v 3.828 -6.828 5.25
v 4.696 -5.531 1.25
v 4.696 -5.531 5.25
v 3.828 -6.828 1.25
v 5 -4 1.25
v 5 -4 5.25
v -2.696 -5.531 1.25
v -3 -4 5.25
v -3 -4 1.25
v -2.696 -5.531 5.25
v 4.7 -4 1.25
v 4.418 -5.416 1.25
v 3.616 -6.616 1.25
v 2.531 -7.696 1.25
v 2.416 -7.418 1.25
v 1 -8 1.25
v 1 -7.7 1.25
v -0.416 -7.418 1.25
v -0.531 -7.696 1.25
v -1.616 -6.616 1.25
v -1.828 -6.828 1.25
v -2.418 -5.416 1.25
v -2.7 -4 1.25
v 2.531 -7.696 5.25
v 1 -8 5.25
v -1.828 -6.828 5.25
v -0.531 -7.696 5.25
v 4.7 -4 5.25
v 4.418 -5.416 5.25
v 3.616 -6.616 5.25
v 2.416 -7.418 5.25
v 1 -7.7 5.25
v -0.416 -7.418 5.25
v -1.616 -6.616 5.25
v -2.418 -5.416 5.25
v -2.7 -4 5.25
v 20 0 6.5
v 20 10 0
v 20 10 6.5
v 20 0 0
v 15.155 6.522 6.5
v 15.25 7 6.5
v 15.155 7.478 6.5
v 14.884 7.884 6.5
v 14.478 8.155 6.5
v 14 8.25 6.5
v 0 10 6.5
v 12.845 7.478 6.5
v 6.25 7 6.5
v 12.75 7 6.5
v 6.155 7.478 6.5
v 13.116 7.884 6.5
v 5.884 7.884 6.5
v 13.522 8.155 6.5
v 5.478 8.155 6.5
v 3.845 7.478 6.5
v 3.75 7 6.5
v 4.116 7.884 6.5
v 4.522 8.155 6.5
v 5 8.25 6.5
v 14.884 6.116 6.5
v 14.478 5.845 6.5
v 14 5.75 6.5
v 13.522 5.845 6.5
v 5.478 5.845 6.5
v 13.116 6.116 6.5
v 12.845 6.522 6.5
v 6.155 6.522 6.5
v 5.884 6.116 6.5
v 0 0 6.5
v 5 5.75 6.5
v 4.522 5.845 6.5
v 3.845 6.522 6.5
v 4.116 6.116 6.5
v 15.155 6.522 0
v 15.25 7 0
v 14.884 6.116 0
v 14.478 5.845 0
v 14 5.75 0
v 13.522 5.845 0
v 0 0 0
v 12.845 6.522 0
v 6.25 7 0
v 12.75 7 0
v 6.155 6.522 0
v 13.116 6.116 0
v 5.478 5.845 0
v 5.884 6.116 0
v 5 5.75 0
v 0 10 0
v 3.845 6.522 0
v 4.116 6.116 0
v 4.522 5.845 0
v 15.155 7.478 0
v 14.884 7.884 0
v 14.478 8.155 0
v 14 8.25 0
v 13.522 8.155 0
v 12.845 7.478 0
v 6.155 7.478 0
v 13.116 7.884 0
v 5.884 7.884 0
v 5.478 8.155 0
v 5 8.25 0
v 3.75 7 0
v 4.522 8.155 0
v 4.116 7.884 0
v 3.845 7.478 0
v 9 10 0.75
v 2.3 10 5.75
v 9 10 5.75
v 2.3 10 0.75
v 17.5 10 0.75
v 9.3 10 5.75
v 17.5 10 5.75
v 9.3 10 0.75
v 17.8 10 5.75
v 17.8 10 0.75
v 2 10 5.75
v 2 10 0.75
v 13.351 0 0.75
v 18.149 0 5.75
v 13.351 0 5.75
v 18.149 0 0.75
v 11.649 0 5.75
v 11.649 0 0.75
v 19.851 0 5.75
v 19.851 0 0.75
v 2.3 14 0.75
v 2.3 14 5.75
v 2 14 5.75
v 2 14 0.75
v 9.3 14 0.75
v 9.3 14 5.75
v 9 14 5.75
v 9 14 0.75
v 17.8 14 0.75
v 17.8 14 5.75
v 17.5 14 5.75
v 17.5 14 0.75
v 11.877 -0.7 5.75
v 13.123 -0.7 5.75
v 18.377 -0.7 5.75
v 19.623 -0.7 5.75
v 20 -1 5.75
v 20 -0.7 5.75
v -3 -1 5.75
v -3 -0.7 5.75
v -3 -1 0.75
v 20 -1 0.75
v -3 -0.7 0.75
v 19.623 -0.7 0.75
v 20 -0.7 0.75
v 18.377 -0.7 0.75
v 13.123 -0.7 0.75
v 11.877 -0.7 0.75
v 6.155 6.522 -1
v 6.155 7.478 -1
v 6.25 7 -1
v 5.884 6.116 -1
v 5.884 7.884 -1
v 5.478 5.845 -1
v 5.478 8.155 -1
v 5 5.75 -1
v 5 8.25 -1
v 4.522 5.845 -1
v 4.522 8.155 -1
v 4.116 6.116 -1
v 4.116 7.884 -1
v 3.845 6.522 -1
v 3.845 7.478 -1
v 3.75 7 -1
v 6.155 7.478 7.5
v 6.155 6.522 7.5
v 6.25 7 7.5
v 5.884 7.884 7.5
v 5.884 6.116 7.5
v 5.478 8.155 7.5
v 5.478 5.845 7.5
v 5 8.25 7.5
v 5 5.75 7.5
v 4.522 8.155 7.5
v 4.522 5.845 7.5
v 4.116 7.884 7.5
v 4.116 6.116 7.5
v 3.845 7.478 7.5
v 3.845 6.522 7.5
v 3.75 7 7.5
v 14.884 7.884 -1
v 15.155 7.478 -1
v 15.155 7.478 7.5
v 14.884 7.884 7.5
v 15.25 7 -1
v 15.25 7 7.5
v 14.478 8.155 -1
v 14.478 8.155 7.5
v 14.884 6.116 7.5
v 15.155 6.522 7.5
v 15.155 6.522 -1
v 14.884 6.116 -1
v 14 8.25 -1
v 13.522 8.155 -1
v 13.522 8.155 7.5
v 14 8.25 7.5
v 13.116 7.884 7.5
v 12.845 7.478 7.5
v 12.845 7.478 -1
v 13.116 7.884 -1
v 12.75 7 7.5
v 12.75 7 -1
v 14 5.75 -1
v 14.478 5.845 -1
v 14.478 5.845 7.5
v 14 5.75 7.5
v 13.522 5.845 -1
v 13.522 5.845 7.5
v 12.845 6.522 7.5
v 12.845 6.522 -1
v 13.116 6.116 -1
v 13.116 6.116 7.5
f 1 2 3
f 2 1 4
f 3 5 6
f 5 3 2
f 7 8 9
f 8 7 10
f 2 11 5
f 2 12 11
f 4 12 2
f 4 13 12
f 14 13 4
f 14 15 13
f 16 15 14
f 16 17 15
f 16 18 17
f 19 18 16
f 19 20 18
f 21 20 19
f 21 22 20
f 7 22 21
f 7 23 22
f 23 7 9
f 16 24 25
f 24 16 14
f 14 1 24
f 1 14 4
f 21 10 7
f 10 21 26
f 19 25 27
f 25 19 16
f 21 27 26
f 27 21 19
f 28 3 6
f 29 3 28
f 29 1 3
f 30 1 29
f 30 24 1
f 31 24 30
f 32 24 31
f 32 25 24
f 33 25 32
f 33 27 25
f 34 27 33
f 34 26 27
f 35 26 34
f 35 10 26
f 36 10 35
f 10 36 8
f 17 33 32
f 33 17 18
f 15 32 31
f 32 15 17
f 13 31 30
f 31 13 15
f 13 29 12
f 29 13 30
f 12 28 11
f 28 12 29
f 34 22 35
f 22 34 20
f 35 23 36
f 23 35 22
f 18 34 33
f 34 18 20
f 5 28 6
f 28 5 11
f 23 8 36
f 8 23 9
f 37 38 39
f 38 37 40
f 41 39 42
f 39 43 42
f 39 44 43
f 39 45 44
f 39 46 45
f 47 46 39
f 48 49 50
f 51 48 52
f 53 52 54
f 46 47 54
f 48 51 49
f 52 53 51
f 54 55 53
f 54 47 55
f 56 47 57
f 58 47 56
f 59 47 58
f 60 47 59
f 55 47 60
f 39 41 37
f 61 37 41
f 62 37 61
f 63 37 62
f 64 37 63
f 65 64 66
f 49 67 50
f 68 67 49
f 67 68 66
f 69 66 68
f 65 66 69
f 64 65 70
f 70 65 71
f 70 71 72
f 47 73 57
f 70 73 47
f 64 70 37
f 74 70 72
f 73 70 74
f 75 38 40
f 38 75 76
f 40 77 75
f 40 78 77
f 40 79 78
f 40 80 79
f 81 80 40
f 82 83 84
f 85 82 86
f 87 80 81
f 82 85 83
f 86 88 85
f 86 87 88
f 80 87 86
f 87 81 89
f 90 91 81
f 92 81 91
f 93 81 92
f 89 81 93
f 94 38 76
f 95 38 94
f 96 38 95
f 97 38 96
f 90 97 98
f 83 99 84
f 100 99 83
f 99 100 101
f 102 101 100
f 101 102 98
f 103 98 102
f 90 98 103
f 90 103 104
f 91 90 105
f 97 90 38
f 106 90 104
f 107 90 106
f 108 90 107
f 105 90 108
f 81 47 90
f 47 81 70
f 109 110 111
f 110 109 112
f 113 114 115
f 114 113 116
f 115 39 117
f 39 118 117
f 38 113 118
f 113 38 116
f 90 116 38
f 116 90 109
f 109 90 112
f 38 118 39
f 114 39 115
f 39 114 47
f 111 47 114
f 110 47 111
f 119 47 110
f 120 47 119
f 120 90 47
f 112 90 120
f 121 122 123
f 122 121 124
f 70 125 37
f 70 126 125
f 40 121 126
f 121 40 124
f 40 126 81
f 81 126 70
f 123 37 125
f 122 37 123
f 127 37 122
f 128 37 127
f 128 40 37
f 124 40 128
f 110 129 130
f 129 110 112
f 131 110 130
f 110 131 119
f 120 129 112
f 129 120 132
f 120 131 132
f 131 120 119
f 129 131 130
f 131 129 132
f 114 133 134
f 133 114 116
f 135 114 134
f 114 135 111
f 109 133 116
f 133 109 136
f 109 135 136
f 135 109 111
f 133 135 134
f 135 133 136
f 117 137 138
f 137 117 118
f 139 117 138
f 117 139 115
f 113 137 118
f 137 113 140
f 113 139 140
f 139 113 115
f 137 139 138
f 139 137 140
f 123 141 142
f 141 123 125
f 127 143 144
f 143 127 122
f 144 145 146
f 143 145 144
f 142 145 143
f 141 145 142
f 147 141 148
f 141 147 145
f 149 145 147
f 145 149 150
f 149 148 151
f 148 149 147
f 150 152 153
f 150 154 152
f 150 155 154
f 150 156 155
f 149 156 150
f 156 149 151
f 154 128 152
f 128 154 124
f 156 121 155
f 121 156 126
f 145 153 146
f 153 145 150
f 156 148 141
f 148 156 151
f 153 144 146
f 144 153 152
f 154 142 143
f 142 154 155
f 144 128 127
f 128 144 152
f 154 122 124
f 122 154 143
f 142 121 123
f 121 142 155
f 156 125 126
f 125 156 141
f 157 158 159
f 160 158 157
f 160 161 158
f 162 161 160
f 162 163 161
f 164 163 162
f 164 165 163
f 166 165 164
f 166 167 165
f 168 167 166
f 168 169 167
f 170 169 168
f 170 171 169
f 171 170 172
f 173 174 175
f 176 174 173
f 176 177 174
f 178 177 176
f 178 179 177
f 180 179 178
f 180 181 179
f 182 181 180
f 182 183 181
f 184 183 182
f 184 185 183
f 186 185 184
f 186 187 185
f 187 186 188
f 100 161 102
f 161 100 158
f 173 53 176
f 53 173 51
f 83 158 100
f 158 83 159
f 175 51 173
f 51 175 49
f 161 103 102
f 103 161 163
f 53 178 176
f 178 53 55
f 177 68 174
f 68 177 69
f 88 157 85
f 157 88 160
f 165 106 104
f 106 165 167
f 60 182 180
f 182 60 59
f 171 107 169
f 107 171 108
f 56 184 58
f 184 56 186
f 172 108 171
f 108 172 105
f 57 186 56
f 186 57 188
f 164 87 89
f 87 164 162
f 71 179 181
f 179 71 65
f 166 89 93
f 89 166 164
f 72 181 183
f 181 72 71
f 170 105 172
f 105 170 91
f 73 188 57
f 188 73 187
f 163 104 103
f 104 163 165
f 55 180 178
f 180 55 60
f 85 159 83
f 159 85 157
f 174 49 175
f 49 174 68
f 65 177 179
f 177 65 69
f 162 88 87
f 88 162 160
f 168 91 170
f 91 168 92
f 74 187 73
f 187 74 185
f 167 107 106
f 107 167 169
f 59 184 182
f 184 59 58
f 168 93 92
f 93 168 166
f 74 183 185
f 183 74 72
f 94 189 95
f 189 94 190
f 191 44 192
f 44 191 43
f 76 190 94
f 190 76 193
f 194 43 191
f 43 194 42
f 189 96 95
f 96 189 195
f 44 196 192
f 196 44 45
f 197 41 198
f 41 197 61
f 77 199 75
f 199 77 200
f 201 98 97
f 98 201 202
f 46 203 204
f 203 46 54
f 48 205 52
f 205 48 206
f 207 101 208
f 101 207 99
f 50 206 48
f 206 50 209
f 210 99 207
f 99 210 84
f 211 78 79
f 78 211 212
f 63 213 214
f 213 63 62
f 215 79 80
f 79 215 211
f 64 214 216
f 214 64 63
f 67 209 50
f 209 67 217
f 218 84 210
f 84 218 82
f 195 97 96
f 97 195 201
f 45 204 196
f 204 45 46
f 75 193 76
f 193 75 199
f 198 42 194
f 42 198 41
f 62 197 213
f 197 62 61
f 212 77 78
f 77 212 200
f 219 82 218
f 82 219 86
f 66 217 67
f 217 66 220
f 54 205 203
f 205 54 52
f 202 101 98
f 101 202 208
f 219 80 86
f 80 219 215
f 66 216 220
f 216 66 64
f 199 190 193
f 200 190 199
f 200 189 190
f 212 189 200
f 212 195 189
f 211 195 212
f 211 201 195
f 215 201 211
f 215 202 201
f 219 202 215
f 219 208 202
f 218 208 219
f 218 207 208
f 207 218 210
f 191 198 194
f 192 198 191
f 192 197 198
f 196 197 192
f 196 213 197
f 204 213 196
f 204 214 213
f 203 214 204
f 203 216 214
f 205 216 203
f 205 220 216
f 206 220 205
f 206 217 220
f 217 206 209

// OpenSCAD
module EndSwitchBody20x11(boltOnly=0)
{
	if( !boltOnly )
	{
		color( "black") cube([20,10,6.5]);
		color ("Silver") translate([2,10,1.5/2]) cube([0.3,4,5]);
		color ("Silver") translate([9,10,1.5/2]) cube([0.3,4,5]);
		color ("Silver") translate([17.5,10,1.5/2]) cube([0.3,4,5]);
		color ("Silver") translate([20,-1,1.5/2]) rotate([0,0,0+90]) cube([0.3,23,5]);
		color ("Silver") translate([19,0,1.5/2]) rotate([0,0,0+90]) cylinder(r=1.0,h=5);
		color ("red") translate([12.5,0,1.5/2]) rotate([0,0,0+90]) cylinder(r=1.0,h=5);
		color ("red") translate([5,7,-1]) cylinder(r=1.0,h=8.5,$fn=16);
		color ("red") translate([5,7,-1]) cylinder(r=1.25,h=8.5,$fn=16);
		color ("red") translate([14,7,-1]) cylinder(r=1.25,h=8.5,$fn=16);
		color ("Silver") translate([1,-4,-1]) difference()
		{
			translate([0,0,2.25]) cylinder(r=4,h=4,$fn=16);
			translate([0,0,-1]) cylinder(r=4-0.3,h=10,$fn=16);
			translate([-10,0,-1]) cube([20,20,10]);
		}
	}
	else
	{
		color ("red") translate([5,7,-50]) cylinder(r=1.25,h=100,$fn=16);
		color ("red") translate([14,7,-50]) cylinder(r=1.25,h=100,$fn=16);
	}
	//translate([-3,-3,0])  cube([3,3,5]);
}
EndSwitchBody20x11();
